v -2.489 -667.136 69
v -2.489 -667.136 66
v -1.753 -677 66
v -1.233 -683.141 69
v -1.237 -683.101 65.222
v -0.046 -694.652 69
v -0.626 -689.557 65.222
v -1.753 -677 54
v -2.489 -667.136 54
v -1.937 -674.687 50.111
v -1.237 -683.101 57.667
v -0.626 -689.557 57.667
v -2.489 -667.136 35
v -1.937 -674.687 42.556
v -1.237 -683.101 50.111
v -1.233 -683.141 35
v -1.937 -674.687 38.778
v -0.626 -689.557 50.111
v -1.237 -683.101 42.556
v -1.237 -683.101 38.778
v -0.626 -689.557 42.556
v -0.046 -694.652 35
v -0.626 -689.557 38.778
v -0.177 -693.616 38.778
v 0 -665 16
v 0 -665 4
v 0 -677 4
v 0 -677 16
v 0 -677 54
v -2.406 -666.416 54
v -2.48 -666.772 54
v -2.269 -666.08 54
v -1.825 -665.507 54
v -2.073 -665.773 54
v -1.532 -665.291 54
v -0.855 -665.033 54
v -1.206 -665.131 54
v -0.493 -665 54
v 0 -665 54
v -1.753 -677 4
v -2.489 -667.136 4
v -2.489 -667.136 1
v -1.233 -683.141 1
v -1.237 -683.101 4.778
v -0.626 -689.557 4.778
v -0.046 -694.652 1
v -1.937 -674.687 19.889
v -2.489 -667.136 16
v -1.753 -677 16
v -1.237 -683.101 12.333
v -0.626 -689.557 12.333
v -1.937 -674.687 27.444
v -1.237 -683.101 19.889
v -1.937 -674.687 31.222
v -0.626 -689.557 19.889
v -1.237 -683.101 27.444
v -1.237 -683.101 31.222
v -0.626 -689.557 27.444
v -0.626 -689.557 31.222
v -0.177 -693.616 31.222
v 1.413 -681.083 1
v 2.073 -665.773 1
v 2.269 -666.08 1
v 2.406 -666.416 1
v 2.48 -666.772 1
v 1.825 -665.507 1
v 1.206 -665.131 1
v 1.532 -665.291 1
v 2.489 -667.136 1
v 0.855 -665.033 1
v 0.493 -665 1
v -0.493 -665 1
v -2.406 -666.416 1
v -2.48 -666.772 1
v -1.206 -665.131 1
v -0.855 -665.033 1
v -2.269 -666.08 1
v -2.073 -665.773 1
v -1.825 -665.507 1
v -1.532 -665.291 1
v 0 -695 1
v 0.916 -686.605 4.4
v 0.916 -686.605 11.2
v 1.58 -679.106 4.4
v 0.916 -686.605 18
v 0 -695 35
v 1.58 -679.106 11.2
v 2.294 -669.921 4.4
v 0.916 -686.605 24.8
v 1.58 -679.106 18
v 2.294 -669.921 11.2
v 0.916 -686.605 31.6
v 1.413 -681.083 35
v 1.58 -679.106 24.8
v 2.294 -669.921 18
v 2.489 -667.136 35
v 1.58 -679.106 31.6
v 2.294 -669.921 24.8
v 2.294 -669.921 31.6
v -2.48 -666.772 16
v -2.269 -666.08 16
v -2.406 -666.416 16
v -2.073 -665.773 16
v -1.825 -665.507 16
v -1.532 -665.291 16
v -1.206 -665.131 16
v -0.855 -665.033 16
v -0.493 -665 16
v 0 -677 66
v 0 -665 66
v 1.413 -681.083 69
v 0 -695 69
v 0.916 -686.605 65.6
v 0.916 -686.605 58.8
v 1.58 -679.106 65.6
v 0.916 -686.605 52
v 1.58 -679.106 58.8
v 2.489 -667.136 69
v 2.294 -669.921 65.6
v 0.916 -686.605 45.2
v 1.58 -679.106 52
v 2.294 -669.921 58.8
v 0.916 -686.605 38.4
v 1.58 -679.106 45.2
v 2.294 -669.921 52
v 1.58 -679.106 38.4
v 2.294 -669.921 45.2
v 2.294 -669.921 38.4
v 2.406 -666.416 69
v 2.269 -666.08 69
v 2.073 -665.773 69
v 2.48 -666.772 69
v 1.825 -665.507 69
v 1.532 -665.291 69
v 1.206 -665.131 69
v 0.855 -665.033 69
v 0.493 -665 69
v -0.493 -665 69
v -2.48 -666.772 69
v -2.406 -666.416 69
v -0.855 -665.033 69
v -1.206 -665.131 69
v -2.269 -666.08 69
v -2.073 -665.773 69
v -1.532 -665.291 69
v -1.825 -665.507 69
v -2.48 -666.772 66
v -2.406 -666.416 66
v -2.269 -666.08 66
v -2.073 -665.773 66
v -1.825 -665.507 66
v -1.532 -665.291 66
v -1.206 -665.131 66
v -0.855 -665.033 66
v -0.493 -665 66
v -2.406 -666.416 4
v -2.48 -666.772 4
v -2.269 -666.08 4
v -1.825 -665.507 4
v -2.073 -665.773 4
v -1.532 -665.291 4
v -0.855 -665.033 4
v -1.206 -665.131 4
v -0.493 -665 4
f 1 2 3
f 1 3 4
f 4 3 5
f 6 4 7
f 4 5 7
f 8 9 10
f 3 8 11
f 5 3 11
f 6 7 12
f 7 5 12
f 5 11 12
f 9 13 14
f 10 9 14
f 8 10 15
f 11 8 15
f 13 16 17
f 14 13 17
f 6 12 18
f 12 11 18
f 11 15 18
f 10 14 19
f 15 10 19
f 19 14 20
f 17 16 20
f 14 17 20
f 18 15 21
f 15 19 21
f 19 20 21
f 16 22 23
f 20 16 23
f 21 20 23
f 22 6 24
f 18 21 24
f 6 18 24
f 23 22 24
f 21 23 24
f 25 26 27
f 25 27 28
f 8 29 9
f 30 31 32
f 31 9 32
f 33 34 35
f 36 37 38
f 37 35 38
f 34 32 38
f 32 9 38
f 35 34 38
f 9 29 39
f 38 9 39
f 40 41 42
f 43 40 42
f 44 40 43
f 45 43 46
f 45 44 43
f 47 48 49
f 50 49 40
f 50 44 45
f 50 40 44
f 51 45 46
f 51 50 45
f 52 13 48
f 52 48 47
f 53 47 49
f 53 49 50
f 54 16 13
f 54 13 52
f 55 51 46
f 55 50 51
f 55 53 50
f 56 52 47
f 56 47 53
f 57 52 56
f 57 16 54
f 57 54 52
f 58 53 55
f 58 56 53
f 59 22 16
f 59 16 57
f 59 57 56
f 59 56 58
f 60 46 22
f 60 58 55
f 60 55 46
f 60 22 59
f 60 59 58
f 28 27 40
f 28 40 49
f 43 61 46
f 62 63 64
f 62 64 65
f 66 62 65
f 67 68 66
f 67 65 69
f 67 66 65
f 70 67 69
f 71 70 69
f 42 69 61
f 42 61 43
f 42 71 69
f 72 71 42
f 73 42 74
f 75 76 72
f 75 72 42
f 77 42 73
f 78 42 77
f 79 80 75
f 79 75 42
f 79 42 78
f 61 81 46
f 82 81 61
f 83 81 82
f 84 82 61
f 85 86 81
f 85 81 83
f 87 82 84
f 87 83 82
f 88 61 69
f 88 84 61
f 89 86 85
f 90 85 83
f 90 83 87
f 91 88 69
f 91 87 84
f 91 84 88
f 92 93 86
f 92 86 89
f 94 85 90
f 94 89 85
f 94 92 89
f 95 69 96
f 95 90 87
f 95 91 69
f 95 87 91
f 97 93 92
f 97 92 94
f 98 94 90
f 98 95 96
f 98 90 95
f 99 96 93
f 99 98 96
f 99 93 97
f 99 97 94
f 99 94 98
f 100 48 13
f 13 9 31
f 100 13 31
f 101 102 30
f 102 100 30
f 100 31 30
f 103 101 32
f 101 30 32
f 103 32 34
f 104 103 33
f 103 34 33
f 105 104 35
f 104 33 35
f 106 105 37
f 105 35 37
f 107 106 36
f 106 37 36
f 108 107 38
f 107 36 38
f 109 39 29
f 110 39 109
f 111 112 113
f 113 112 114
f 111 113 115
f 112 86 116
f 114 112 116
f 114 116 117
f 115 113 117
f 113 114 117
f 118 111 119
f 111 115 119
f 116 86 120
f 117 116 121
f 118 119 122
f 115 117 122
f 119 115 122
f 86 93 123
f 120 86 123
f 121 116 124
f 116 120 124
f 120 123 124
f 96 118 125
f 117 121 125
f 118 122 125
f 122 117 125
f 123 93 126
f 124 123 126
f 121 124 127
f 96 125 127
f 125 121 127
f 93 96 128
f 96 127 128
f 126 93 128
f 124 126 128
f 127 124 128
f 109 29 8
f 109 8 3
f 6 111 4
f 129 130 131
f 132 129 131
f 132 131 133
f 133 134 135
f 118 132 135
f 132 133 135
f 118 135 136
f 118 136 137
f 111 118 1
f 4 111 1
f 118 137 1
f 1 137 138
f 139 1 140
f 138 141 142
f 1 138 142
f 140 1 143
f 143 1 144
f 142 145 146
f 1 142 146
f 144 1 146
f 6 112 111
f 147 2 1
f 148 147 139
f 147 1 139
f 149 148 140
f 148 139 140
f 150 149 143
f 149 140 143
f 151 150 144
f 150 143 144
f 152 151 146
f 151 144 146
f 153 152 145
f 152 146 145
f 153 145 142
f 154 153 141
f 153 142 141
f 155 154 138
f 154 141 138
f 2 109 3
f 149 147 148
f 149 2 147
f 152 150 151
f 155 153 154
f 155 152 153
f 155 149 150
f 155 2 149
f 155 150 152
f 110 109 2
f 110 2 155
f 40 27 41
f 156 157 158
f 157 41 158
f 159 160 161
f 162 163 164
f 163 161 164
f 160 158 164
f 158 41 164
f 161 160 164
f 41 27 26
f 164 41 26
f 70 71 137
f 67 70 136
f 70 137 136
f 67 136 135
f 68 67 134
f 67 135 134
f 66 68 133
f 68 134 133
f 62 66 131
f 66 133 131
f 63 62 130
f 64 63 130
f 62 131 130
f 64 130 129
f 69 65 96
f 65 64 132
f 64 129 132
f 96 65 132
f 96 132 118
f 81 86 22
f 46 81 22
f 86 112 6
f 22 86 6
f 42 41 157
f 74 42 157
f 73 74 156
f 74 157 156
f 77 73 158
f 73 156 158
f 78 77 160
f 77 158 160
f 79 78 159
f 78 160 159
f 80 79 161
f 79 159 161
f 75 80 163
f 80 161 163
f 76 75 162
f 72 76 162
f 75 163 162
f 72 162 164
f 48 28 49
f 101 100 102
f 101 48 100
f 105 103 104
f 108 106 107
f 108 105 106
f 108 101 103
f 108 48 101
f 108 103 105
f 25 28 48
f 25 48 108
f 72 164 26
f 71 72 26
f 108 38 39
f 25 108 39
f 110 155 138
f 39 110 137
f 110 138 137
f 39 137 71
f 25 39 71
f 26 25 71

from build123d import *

# Parameters (mm, degrees)
BOSS_EXTRUDE1_DEPTH = 34
SKETCH4_W           = 12
SKETCH4_H           = 12
CUT_EXTRUDE1_DEPTH  = 3.493295554


with BuildPart() as part:
    # Sketch2 → Boss-Extrude1 (new body, symmetric)
    with BuildSketch(Plane.XY.offset(35)):
        with BuildLine():
            Line((-0.493295454, -665), (0.493295611, -665))
            ThreePointArc((0.493295611, -665), (1.954790004, -665.634703644), (2.488668579, -667.135965861))
            add(Edge.make_bspline(
                [(0, -695), (0.015522073, -694.884094445), (0.077278927, -694.422947112), (0.206148599, -693.392547034), (0.403716276, -691.694585868), (0.648953841, -689.357636132), (0.936738043, -686.422103162), (1.254326755, -682.93824868), (1.595587122, -678.965683583), (1.950533146, -674.572635912), (2.249009374, -670.582285025), (2.425394007, -668.064554633), (2.488668579, -667.135965861)],
                knots=[0.816447502, 0.816447502, 0.816447502, 0.816447502, 0.818585491, 0.824953805, 0.835432492, 0.849837851, 0.867913595, 0.889359146, 0.913796005, 0.94081031, 0.969937518, 0.986954026, 0.986954026, 0.986954026, 0.986954026], degree=3))
            Line((0, -695), (-0.0463125, -694.65225))
            add(Edge.make_bspline(
                [(-2.488668416, -667.135965964), (-2.425393799, -668.064554688), (-2.249009192, -670.582285042), (-1.950535166, -674.572636178), (-1.595580455, -678.965682707), (-1.254347923, -682.938251461), (-0.936673997, -686.422094747), (-0.649135543, -689.357660004), (-0.403246318, -691.694524123), (-0.207189019, -693.39268373), (-0.090443378, -694.3067318), (-0.0463125, -694.65225)],
                knots=[0.013045974, 0.013045974, 0.013045974, 0.013045974, 0.030062482, 0.05918969, 0.086203995, 0.110640854, 0.132086405, 0.150162149, 0.164567508, 0.175046195, 0.181414509, 0.181414509, 0.181414509, 0.181414509], degree=3))
            ThreePointArc((-2.488668416, -667.135965964), (-1.954789882, -665.634703682), (-0.493295454, -665))
        make_face()
    extrude(amount=BOSS_EXTRUDE1_DEPTH, both=True)

    # Sketch4 → Cut-Extrude1 (cut, through all)
    with BuildSketch(Plane.ZY):
        with Locations((60, -671)):
            Rectangle(SKETCH4_W, SKETCH4_H)
        with Locations((10, -671)):
            Rectangle(SKETCH4_W, SKETCH4_H)
    extrude(amount=CUT_EXTRUDE1_DEPTH, mode=Mode.SUBTRACT)


solid = part.part
